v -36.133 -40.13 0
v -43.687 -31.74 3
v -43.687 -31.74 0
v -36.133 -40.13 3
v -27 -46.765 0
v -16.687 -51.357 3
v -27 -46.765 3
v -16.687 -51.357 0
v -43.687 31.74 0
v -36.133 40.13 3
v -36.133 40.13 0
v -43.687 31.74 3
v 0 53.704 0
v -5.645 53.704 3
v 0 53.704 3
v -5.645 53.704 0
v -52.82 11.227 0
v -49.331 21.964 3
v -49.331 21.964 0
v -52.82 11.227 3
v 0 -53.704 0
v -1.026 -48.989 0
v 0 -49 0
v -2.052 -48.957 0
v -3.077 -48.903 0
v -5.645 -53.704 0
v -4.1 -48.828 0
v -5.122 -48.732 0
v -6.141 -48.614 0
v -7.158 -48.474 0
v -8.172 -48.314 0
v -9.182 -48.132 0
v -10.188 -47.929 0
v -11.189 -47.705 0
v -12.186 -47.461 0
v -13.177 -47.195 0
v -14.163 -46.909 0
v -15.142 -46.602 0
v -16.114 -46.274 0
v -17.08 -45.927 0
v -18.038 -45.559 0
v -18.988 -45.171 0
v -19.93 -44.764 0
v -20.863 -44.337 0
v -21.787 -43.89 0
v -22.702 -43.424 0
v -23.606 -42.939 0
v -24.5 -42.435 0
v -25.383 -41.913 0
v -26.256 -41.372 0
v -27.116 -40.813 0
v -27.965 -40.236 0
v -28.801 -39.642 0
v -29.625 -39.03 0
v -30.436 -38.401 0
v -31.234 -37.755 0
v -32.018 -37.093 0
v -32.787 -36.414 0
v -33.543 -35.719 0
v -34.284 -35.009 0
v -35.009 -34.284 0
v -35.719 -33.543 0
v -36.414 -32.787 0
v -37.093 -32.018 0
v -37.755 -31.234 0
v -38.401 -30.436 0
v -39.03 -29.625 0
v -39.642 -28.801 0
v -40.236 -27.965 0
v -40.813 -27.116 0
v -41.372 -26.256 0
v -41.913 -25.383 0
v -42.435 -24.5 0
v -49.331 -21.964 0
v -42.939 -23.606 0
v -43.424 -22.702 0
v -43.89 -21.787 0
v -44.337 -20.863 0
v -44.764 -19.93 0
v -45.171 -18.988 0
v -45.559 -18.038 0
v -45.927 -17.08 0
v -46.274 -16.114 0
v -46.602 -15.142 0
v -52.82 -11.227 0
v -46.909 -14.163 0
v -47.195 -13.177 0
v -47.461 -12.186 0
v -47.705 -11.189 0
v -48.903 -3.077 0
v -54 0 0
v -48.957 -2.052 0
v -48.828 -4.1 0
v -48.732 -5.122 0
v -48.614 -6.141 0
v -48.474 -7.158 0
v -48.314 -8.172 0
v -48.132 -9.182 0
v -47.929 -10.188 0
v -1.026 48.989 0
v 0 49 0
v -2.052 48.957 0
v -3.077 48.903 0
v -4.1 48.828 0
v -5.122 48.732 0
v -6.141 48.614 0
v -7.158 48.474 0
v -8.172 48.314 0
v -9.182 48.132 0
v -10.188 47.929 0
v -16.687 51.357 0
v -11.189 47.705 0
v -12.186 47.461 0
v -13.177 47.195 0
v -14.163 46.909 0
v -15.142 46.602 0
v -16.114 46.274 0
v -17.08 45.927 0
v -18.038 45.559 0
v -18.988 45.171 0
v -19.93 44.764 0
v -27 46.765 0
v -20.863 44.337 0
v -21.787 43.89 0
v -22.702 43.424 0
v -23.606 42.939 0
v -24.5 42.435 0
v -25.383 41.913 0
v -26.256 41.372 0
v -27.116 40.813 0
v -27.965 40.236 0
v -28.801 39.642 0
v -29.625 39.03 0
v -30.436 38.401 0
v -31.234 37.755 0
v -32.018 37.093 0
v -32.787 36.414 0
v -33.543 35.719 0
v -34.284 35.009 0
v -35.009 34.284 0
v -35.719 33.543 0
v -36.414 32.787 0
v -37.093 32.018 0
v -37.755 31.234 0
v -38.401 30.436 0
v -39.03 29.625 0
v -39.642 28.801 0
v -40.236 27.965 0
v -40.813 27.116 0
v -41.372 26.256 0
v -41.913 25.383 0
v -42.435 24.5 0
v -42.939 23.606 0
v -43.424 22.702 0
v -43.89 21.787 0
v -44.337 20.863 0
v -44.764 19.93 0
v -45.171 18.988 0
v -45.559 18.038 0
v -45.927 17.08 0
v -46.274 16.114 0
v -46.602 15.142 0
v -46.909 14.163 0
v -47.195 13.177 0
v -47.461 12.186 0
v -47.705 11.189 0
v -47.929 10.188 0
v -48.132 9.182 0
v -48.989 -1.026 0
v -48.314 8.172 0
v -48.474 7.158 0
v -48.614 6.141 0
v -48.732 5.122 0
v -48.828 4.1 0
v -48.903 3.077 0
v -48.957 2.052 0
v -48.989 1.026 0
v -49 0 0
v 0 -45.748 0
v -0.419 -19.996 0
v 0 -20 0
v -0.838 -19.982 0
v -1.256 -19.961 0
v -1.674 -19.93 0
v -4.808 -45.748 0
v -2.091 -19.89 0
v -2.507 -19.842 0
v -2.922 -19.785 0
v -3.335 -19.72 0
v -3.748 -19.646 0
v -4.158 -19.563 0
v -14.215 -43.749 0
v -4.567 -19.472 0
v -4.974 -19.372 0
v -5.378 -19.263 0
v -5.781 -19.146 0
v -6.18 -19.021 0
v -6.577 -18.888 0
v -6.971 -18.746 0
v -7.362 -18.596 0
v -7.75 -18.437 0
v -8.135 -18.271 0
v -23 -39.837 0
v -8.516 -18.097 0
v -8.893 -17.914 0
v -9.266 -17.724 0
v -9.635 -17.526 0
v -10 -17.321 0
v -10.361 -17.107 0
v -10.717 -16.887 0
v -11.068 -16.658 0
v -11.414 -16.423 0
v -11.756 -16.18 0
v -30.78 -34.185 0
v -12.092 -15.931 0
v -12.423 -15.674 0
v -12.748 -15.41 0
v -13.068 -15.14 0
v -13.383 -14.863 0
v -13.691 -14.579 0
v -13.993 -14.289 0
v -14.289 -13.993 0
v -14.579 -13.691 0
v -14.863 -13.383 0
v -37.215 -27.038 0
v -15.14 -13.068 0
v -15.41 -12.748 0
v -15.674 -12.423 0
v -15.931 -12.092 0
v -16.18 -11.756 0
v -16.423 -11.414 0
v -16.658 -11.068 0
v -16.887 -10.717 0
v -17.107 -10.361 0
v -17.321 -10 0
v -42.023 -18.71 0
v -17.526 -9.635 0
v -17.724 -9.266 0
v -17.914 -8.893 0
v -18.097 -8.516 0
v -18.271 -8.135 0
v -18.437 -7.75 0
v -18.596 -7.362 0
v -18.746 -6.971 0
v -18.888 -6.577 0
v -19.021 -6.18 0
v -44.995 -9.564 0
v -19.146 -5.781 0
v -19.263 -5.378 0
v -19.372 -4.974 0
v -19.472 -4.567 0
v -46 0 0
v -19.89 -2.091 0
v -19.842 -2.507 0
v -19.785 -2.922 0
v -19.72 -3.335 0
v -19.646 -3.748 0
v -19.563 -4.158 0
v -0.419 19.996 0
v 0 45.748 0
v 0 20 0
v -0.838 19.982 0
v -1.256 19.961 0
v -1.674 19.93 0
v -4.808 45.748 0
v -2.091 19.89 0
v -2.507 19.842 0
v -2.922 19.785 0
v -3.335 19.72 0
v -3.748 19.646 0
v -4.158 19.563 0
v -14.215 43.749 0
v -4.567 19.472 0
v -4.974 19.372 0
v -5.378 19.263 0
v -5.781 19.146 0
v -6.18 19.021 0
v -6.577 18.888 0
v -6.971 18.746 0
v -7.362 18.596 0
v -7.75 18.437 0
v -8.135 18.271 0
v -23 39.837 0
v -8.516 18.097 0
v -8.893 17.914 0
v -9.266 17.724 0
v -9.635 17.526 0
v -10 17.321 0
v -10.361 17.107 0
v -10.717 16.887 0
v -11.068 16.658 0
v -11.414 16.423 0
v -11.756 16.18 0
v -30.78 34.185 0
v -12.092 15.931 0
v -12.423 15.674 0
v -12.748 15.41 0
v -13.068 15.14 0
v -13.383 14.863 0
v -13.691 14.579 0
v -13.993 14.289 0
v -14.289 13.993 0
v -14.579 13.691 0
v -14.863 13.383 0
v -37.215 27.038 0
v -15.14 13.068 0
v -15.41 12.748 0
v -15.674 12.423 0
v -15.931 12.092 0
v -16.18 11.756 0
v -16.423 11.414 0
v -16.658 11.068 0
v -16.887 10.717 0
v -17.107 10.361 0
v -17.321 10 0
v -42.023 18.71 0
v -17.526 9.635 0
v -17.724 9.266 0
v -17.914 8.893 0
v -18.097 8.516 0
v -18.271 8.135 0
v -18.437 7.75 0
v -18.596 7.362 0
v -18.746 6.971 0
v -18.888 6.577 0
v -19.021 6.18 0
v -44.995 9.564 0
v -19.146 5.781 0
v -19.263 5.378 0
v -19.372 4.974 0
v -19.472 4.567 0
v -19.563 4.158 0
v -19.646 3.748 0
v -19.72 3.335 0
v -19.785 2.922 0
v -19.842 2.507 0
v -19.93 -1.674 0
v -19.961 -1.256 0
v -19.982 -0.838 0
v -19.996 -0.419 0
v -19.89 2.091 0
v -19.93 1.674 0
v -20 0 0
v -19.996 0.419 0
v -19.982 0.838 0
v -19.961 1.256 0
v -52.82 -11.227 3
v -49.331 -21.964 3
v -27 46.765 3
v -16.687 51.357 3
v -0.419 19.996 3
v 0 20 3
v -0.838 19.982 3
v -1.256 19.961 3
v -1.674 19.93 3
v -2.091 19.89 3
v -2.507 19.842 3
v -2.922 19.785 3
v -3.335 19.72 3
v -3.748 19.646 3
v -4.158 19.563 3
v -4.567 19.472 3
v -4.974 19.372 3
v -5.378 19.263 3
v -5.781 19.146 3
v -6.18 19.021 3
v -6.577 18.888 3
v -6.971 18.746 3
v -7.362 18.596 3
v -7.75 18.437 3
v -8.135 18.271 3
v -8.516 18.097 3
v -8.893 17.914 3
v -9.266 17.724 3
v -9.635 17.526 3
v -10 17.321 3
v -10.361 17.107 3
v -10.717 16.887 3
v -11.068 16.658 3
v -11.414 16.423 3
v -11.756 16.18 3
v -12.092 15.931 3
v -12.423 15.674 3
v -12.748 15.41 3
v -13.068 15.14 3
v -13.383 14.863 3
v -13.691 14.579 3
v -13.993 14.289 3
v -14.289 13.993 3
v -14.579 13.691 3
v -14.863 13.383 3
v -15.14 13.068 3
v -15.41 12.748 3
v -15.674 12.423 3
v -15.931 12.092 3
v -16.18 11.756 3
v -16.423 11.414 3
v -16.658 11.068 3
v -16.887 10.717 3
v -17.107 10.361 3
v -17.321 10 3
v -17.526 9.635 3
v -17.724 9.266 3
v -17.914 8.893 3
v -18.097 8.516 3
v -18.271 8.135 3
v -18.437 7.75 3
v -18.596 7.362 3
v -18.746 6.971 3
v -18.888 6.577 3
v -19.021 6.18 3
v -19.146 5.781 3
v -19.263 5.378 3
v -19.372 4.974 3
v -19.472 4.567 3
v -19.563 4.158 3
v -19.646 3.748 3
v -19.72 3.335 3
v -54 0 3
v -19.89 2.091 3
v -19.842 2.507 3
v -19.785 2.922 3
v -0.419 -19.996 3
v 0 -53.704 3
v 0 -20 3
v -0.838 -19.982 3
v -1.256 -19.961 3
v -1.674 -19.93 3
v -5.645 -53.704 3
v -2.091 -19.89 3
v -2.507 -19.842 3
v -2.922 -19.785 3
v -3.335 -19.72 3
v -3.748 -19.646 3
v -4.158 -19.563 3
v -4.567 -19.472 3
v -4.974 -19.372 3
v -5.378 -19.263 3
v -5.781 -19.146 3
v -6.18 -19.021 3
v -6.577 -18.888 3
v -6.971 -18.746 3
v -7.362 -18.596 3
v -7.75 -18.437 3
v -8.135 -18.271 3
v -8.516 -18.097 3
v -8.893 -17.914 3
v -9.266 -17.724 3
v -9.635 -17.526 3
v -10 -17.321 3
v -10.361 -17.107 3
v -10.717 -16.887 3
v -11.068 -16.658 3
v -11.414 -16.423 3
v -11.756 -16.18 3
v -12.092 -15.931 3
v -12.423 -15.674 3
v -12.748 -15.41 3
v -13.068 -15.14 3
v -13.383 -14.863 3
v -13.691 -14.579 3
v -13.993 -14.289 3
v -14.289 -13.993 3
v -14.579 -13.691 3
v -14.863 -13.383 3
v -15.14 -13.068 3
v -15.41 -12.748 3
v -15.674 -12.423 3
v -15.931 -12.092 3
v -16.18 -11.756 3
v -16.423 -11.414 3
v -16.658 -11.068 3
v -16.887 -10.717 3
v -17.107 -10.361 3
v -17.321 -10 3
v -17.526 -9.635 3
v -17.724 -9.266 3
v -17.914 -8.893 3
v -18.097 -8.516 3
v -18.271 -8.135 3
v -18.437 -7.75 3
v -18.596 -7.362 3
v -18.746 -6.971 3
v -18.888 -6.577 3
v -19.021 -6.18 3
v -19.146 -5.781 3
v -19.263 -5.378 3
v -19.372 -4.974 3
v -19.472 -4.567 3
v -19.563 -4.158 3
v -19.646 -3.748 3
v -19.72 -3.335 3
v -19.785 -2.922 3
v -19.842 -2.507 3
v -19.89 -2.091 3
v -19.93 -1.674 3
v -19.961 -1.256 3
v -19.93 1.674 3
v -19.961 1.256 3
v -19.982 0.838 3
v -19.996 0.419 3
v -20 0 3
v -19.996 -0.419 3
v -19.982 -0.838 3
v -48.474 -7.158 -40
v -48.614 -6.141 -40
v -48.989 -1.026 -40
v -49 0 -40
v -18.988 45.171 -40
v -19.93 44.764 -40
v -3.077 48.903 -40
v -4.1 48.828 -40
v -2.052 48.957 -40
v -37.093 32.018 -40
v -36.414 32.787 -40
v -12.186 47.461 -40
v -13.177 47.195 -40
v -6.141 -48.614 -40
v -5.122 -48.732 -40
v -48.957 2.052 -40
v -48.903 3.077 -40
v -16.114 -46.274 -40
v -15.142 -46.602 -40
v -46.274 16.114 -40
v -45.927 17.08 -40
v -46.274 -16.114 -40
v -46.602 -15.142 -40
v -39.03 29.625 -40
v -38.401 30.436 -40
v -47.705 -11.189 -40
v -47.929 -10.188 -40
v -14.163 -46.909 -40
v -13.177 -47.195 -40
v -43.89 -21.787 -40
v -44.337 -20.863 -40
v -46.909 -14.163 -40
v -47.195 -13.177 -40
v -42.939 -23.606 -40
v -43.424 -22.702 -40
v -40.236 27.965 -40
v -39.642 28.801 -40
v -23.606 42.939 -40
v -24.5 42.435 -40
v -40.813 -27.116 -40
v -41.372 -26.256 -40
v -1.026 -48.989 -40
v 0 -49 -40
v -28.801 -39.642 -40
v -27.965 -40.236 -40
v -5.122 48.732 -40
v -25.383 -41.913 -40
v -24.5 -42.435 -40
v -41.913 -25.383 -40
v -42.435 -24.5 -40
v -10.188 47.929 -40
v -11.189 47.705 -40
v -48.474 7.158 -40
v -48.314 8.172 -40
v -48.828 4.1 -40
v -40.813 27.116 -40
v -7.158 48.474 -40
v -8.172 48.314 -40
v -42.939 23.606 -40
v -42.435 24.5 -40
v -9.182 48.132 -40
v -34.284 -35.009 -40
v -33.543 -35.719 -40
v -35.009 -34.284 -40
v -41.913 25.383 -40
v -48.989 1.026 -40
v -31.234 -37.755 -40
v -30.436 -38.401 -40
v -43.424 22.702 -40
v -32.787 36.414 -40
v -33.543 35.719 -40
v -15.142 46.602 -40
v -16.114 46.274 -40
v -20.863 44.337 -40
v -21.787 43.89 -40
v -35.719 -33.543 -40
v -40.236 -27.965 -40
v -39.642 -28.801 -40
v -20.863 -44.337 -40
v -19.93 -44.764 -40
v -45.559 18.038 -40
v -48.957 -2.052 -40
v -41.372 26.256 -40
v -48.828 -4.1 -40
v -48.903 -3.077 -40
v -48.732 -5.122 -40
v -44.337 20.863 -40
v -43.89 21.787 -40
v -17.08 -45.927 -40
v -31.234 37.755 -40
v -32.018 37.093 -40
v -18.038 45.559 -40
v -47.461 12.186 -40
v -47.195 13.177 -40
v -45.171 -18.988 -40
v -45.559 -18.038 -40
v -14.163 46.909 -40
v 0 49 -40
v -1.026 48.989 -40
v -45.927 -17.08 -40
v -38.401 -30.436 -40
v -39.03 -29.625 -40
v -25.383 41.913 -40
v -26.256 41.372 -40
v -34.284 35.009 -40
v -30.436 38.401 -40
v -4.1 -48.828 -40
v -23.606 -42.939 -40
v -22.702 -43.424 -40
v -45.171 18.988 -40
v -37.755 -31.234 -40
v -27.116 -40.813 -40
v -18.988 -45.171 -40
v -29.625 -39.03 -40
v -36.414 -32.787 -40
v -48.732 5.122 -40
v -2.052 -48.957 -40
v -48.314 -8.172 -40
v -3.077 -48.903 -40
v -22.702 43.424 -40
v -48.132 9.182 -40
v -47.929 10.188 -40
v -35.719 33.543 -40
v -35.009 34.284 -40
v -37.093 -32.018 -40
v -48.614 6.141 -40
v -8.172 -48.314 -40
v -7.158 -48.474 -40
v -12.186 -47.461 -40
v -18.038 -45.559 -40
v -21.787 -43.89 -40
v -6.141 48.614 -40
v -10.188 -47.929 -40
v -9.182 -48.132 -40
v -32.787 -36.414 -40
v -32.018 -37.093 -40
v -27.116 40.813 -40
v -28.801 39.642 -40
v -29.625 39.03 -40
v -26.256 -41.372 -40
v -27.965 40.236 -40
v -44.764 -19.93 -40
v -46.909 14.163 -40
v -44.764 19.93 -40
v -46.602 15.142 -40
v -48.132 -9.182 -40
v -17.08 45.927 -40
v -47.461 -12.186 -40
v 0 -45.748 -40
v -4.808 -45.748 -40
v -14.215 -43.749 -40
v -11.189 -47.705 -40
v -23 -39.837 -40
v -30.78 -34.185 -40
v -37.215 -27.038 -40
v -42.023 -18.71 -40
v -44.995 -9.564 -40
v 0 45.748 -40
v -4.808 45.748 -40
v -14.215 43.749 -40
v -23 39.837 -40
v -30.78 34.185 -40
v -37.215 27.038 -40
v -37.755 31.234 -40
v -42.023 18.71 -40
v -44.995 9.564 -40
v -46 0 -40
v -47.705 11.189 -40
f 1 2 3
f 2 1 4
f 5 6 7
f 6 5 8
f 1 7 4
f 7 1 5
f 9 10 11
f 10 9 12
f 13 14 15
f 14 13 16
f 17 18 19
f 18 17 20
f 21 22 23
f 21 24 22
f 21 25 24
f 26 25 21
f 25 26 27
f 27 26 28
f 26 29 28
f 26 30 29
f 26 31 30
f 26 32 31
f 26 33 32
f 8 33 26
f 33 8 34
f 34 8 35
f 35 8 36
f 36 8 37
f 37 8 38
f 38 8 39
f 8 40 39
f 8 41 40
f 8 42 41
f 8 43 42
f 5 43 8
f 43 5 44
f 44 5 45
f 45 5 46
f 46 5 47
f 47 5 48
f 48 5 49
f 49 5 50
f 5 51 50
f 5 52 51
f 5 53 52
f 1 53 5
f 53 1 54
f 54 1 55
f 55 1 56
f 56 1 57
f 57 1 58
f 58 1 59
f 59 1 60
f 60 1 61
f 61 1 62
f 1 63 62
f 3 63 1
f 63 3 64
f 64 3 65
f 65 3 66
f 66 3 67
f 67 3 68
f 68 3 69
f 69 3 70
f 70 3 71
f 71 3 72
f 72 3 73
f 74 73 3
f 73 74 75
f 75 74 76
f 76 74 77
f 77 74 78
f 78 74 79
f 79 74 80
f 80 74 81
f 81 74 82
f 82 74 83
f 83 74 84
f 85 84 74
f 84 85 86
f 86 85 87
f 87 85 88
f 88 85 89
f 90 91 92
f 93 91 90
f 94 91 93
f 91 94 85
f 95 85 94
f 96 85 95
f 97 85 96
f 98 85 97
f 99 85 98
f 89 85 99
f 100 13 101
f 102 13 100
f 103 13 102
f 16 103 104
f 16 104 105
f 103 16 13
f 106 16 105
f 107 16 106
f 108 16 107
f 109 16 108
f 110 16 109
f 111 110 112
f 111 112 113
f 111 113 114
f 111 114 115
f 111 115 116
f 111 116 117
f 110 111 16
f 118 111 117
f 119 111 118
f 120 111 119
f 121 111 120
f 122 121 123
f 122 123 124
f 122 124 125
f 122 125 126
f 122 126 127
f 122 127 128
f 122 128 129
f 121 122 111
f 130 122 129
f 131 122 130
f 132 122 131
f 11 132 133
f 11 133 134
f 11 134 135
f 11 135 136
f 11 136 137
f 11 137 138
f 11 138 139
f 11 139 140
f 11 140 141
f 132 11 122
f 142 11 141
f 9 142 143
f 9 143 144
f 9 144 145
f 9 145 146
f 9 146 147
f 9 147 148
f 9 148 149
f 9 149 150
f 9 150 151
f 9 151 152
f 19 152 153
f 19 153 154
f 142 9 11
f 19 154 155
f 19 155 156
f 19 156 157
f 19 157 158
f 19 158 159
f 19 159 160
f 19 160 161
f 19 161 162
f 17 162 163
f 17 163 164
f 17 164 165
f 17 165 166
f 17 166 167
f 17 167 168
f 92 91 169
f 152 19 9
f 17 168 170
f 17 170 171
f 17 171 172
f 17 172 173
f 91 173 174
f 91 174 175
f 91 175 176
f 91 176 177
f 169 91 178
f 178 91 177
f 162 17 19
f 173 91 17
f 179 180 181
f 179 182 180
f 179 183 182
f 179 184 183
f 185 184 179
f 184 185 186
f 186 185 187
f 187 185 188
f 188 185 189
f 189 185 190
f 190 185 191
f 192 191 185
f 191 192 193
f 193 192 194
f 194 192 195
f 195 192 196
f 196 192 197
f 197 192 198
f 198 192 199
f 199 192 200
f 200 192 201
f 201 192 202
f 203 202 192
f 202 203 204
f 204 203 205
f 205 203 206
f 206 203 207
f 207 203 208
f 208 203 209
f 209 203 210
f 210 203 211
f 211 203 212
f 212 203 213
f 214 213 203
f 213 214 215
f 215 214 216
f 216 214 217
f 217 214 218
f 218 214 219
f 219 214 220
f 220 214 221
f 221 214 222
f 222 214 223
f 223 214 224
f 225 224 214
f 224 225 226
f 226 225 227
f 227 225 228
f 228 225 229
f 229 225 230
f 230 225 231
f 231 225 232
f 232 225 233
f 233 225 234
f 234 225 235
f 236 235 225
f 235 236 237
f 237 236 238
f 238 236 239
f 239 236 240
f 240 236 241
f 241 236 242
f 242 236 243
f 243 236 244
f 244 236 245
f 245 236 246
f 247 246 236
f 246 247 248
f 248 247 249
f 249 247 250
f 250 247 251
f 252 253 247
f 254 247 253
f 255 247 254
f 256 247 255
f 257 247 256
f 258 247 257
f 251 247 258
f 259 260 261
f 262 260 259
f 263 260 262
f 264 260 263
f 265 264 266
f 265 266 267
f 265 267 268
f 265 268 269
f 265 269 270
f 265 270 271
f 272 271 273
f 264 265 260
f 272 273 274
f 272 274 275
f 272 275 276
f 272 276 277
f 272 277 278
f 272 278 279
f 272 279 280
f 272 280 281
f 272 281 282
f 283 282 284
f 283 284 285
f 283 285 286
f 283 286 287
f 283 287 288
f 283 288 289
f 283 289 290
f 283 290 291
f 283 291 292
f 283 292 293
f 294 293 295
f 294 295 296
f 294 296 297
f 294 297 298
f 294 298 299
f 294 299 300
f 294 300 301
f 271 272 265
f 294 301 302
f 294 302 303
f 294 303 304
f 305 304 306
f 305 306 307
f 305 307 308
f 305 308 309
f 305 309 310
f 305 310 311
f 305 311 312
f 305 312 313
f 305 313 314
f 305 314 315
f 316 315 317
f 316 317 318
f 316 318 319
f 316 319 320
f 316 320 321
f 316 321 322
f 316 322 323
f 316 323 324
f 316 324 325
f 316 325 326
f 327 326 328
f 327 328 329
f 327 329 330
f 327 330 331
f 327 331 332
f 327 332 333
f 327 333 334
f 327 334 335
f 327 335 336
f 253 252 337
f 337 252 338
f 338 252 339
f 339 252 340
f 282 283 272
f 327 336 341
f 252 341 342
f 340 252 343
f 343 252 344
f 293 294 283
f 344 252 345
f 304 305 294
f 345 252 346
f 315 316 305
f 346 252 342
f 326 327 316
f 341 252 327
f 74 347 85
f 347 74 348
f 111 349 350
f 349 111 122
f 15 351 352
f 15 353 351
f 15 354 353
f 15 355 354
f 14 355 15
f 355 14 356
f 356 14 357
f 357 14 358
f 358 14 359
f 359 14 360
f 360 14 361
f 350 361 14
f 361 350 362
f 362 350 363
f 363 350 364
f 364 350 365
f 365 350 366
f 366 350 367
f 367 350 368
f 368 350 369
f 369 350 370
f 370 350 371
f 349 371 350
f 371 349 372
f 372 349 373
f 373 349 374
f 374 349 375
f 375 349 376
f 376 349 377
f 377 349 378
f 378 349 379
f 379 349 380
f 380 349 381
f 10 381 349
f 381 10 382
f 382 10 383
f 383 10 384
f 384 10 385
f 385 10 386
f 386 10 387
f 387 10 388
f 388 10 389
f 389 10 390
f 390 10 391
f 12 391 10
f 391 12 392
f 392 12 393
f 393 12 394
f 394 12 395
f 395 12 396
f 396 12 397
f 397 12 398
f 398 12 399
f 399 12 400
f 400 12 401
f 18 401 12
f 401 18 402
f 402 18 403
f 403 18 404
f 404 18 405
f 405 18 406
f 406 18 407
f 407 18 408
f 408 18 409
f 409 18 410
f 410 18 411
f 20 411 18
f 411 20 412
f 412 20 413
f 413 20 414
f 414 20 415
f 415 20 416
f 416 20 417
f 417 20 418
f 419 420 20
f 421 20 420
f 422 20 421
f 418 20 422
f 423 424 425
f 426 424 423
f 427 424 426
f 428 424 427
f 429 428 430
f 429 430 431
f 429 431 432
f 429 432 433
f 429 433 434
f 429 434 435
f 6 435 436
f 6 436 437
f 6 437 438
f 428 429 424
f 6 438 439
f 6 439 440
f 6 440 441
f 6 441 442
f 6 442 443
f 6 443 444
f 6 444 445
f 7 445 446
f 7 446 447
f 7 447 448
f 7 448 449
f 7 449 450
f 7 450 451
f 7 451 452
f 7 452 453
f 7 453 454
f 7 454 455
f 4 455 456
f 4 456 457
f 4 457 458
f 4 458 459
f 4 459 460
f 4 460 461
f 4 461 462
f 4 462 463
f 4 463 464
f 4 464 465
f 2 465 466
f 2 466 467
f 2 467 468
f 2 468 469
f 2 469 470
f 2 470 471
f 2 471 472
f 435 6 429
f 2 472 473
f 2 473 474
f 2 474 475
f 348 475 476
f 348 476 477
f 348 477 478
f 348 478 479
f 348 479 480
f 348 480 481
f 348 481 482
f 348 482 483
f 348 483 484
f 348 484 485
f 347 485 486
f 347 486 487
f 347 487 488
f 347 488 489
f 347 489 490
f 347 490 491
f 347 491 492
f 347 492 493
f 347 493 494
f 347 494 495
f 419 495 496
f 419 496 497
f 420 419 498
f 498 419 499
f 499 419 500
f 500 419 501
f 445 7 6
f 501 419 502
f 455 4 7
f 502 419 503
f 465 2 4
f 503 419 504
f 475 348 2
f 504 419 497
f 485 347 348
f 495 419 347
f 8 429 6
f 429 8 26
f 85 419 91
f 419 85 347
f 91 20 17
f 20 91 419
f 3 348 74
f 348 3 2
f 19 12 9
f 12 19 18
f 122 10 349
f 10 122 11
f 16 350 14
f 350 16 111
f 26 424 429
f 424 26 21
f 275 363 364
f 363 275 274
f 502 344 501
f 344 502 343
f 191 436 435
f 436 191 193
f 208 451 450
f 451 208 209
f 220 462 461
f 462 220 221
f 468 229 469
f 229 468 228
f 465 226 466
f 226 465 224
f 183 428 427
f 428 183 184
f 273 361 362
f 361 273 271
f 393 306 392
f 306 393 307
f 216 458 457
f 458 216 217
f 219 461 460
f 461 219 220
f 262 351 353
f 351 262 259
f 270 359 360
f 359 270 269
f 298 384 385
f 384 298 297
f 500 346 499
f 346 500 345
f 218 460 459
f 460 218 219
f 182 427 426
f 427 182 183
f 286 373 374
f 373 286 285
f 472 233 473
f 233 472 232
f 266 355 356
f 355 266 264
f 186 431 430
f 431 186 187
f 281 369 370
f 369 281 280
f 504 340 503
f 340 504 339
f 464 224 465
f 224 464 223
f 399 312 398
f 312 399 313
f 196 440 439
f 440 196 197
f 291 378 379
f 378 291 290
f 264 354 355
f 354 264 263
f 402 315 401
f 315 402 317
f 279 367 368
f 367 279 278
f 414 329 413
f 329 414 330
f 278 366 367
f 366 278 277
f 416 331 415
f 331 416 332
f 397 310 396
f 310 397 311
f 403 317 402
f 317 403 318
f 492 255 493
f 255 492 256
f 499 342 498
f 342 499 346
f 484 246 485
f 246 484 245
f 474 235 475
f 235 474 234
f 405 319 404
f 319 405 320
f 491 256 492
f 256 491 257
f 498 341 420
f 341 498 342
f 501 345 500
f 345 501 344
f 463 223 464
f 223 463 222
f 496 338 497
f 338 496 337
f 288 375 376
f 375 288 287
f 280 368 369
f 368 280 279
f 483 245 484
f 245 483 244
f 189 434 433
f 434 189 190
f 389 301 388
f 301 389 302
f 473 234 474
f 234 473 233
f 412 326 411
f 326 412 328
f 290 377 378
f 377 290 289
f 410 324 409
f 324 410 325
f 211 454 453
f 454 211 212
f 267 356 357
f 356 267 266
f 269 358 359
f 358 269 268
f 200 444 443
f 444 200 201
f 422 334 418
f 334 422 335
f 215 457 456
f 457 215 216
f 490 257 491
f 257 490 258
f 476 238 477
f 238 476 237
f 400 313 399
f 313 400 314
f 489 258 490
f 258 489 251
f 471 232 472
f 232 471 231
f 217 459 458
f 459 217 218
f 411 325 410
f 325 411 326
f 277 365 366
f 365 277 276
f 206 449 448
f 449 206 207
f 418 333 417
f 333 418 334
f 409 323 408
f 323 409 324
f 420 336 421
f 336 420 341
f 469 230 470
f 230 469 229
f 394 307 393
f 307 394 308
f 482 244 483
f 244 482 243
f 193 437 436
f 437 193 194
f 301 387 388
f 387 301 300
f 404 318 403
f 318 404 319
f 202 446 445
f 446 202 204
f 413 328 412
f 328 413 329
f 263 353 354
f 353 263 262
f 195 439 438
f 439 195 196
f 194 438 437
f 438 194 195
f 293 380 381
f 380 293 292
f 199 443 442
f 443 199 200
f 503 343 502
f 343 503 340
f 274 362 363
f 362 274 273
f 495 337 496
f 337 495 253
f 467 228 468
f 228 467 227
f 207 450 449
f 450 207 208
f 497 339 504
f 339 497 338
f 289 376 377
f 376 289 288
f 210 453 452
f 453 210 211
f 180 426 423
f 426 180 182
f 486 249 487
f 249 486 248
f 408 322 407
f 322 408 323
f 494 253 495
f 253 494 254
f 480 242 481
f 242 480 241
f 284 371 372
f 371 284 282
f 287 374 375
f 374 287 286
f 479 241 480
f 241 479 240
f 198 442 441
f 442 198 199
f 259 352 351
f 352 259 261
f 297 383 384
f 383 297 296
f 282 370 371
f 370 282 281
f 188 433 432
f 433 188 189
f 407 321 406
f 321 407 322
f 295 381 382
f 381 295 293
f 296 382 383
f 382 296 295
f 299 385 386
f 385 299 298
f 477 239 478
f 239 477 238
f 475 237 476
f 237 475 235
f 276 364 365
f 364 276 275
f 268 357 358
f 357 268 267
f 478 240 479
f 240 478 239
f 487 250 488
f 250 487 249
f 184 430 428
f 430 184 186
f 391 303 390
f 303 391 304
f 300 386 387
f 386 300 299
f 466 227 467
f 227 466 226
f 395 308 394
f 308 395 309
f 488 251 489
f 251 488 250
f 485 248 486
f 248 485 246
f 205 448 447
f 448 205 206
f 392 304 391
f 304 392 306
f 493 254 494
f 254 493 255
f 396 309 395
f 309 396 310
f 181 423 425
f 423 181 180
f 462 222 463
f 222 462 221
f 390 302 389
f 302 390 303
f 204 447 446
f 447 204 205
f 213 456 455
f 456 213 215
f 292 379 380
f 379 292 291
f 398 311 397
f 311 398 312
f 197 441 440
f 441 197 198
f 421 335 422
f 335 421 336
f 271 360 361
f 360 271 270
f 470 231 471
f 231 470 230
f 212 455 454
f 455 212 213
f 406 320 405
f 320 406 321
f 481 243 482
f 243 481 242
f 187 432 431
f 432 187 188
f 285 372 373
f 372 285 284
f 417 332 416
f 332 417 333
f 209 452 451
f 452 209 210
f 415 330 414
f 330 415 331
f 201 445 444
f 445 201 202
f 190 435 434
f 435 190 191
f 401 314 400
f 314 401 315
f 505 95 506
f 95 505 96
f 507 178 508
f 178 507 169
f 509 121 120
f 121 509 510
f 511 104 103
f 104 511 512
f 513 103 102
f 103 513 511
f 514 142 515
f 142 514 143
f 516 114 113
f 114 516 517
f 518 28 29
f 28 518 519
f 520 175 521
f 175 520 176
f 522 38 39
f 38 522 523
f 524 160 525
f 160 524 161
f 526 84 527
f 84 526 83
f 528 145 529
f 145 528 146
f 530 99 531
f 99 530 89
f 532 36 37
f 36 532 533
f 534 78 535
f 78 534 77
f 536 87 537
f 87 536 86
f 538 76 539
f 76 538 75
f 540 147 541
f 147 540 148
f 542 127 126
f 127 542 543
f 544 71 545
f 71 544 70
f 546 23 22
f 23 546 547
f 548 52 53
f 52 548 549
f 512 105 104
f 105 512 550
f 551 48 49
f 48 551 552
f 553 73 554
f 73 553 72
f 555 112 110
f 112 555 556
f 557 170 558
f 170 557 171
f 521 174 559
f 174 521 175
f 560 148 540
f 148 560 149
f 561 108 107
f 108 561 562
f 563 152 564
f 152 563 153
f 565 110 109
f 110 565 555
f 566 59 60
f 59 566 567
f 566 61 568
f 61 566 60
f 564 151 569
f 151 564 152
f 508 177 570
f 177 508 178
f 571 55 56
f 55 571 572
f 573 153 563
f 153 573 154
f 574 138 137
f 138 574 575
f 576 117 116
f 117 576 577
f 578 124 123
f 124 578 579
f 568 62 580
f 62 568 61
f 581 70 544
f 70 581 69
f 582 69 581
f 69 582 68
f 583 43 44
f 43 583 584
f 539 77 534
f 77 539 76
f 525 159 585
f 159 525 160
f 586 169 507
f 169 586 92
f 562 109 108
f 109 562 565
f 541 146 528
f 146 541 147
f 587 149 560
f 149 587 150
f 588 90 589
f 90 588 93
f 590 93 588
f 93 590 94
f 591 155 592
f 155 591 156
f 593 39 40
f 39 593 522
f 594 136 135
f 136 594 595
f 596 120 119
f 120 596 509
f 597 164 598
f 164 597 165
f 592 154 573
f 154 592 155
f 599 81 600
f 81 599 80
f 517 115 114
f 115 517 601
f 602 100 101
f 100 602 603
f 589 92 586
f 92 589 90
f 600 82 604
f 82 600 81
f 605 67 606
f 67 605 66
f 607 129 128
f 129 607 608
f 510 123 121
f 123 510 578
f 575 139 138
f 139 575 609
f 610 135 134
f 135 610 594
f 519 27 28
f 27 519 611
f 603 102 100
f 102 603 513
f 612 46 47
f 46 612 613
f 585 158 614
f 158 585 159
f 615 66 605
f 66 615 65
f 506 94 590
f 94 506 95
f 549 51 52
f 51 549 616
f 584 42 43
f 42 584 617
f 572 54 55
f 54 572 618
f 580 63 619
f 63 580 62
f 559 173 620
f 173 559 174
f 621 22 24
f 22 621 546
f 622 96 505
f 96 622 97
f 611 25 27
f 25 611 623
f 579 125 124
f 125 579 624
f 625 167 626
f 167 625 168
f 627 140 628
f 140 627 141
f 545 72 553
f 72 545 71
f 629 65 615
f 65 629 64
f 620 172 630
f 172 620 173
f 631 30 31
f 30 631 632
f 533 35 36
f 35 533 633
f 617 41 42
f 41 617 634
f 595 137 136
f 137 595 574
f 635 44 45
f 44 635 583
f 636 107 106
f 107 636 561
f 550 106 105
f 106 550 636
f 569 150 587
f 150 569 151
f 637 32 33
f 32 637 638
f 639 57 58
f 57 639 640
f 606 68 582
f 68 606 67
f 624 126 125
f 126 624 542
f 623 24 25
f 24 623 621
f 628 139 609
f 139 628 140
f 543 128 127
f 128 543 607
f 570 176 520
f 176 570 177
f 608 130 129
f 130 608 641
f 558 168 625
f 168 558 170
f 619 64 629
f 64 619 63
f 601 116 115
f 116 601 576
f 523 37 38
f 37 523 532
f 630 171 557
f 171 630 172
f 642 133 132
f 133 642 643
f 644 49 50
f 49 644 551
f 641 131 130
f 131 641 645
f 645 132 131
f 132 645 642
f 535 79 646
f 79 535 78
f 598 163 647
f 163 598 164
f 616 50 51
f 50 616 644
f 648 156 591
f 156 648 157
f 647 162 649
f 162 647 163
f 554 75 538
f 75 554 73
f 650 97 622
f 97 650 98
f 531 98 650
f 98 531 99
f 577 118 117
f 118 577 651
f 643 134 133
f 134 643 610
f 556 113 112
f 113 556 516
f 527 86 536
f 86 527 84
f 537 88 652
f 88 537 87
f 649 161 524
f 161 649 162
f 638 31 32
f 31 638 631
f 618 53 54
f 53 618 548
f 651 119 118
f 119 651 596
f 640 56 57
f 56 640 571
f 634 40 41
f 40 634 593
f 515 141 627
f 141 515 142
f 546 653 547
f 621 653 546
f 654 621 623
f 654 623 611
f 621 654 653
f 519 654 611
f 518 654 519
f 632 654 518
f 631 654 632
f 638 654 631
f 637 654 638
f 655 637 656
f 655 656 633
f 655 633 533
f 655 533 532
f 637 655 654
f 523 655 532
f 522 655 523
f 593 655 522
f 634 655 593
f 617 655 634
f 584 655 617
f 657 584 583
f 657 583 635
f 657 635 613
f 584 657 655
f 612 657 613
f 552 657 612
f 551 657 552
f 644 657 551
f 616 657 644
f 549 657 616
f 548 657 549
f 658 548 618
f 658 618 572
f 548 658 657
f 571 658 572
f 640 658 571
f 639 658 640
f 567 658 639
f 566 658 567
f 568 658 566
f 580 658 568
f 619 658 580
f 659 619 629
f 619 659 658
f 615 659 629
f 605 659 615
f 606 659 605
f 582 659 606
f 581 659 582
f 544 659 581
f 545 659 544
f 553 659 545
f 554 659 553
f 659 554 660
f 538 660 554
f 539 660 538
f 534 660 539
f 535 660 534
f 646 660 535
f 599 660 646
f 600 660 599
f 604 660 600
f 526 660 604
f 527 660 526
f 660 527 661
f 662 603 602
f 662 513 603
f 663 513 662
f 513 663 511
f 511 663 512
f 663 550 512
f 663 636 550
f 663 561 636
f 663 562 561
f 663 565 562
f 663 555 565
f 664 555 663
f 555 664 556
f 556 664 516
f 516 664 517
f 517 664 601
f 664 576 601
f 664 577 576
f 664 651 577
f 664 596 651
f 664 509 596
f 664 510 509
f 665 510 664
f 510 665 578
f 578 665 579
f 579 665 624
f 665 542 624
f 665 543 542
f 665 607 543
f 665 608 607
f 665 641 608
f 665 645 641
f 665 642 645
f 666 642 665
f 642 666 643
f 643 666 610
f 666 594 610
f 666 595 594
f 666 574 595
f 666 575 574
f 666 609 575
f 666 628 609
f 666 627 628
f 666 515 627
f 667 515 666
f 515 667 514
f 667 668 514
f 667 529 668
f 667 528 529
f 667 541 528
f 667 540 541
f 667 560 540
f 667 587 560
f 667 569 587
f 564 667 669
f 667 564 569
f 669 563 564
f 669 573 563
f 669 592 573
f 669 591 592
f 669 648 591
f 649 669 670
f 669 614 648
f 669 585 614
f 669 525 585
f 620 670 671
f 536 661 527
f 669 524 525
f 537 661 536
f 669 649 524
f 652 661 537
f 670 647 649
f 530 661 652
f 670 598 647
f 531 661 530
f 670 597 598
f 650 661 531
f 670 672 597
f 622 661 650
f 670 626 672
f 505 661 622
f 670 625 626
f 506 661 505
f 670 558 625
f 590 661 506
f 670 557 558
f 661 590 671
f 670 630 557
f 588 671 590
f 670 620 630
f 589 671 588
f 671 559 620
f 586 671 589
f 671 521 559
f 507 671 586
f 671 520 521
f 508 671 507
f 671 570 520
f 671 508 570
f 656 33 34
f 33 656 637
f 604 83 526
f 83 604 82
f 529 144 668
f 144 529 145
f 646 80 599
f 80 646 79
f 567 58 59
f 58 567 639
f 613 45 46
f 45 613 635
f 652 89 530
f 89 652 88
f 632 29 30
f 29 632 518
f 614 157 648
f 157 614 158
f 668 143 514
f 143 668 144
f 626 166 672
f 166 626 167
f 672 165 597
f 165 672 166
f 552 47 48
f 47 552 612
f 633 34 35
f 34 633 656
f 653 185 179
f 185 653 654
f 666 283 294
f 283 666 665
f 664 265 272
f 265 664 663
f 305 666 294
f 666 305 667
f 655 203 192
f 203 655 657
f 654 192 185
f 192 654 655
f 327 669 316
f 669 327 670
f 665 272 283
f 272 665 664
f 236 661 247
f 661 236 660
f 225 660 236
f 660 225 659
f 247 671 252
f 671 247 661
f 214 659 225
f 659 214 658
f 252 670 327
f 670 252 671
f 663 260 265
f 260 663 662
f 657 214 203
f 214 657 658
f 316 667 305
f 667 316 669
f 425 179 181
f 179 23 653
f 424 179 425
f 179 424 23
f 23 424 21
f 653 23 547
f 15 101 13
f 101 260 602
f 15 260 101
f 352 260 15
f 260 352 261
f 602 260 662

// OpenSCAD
// Reservoir (Water Tank)
thickness_lid = 3; //thickness of lid (may play a role on gas diffusion
diam_pipe = 100; // internal diameter of PVC pipe
tol_diam = 1; // tolerance for the internal diameter (takes into account 3D printing)
diam_adapt = diam_pipe - tol_diam *2; // diameter of the adapter

height_inside = 40; // overlap between adapter and tube
thickness_inside = 3; // thickness of wall of adapter inside tube

trunk_diameter = 40; // diameter of trunk. This should be corrected to account for bark, etc.

difference(){
    union(){
        // lid of adapter
        difference(){
            translate([0, 0, thickness_lid/2]){
                color("blue")
                cylinder(h=thickness_lid, d=diam_adapt+10, center=true);
            };
            cylinder(h=thickness_lid*2.5, d=trunk_diameter, center=true,$fn=300);
        };
        // body of adapter
        translate([0, 0, -height_inside]){
            difference(){
            cylinder(h = height_inside, d=diam_adapt ,$fn=300);
            cylinder(h = height_inside+10, d=diam_adapt-thickness_inside*2);
            };
        };
    };
    // use of cube to make two halfs
    translate([1000/2,0,0]){
        cube([1000, 1000, 1000], center=true);
    };
};
